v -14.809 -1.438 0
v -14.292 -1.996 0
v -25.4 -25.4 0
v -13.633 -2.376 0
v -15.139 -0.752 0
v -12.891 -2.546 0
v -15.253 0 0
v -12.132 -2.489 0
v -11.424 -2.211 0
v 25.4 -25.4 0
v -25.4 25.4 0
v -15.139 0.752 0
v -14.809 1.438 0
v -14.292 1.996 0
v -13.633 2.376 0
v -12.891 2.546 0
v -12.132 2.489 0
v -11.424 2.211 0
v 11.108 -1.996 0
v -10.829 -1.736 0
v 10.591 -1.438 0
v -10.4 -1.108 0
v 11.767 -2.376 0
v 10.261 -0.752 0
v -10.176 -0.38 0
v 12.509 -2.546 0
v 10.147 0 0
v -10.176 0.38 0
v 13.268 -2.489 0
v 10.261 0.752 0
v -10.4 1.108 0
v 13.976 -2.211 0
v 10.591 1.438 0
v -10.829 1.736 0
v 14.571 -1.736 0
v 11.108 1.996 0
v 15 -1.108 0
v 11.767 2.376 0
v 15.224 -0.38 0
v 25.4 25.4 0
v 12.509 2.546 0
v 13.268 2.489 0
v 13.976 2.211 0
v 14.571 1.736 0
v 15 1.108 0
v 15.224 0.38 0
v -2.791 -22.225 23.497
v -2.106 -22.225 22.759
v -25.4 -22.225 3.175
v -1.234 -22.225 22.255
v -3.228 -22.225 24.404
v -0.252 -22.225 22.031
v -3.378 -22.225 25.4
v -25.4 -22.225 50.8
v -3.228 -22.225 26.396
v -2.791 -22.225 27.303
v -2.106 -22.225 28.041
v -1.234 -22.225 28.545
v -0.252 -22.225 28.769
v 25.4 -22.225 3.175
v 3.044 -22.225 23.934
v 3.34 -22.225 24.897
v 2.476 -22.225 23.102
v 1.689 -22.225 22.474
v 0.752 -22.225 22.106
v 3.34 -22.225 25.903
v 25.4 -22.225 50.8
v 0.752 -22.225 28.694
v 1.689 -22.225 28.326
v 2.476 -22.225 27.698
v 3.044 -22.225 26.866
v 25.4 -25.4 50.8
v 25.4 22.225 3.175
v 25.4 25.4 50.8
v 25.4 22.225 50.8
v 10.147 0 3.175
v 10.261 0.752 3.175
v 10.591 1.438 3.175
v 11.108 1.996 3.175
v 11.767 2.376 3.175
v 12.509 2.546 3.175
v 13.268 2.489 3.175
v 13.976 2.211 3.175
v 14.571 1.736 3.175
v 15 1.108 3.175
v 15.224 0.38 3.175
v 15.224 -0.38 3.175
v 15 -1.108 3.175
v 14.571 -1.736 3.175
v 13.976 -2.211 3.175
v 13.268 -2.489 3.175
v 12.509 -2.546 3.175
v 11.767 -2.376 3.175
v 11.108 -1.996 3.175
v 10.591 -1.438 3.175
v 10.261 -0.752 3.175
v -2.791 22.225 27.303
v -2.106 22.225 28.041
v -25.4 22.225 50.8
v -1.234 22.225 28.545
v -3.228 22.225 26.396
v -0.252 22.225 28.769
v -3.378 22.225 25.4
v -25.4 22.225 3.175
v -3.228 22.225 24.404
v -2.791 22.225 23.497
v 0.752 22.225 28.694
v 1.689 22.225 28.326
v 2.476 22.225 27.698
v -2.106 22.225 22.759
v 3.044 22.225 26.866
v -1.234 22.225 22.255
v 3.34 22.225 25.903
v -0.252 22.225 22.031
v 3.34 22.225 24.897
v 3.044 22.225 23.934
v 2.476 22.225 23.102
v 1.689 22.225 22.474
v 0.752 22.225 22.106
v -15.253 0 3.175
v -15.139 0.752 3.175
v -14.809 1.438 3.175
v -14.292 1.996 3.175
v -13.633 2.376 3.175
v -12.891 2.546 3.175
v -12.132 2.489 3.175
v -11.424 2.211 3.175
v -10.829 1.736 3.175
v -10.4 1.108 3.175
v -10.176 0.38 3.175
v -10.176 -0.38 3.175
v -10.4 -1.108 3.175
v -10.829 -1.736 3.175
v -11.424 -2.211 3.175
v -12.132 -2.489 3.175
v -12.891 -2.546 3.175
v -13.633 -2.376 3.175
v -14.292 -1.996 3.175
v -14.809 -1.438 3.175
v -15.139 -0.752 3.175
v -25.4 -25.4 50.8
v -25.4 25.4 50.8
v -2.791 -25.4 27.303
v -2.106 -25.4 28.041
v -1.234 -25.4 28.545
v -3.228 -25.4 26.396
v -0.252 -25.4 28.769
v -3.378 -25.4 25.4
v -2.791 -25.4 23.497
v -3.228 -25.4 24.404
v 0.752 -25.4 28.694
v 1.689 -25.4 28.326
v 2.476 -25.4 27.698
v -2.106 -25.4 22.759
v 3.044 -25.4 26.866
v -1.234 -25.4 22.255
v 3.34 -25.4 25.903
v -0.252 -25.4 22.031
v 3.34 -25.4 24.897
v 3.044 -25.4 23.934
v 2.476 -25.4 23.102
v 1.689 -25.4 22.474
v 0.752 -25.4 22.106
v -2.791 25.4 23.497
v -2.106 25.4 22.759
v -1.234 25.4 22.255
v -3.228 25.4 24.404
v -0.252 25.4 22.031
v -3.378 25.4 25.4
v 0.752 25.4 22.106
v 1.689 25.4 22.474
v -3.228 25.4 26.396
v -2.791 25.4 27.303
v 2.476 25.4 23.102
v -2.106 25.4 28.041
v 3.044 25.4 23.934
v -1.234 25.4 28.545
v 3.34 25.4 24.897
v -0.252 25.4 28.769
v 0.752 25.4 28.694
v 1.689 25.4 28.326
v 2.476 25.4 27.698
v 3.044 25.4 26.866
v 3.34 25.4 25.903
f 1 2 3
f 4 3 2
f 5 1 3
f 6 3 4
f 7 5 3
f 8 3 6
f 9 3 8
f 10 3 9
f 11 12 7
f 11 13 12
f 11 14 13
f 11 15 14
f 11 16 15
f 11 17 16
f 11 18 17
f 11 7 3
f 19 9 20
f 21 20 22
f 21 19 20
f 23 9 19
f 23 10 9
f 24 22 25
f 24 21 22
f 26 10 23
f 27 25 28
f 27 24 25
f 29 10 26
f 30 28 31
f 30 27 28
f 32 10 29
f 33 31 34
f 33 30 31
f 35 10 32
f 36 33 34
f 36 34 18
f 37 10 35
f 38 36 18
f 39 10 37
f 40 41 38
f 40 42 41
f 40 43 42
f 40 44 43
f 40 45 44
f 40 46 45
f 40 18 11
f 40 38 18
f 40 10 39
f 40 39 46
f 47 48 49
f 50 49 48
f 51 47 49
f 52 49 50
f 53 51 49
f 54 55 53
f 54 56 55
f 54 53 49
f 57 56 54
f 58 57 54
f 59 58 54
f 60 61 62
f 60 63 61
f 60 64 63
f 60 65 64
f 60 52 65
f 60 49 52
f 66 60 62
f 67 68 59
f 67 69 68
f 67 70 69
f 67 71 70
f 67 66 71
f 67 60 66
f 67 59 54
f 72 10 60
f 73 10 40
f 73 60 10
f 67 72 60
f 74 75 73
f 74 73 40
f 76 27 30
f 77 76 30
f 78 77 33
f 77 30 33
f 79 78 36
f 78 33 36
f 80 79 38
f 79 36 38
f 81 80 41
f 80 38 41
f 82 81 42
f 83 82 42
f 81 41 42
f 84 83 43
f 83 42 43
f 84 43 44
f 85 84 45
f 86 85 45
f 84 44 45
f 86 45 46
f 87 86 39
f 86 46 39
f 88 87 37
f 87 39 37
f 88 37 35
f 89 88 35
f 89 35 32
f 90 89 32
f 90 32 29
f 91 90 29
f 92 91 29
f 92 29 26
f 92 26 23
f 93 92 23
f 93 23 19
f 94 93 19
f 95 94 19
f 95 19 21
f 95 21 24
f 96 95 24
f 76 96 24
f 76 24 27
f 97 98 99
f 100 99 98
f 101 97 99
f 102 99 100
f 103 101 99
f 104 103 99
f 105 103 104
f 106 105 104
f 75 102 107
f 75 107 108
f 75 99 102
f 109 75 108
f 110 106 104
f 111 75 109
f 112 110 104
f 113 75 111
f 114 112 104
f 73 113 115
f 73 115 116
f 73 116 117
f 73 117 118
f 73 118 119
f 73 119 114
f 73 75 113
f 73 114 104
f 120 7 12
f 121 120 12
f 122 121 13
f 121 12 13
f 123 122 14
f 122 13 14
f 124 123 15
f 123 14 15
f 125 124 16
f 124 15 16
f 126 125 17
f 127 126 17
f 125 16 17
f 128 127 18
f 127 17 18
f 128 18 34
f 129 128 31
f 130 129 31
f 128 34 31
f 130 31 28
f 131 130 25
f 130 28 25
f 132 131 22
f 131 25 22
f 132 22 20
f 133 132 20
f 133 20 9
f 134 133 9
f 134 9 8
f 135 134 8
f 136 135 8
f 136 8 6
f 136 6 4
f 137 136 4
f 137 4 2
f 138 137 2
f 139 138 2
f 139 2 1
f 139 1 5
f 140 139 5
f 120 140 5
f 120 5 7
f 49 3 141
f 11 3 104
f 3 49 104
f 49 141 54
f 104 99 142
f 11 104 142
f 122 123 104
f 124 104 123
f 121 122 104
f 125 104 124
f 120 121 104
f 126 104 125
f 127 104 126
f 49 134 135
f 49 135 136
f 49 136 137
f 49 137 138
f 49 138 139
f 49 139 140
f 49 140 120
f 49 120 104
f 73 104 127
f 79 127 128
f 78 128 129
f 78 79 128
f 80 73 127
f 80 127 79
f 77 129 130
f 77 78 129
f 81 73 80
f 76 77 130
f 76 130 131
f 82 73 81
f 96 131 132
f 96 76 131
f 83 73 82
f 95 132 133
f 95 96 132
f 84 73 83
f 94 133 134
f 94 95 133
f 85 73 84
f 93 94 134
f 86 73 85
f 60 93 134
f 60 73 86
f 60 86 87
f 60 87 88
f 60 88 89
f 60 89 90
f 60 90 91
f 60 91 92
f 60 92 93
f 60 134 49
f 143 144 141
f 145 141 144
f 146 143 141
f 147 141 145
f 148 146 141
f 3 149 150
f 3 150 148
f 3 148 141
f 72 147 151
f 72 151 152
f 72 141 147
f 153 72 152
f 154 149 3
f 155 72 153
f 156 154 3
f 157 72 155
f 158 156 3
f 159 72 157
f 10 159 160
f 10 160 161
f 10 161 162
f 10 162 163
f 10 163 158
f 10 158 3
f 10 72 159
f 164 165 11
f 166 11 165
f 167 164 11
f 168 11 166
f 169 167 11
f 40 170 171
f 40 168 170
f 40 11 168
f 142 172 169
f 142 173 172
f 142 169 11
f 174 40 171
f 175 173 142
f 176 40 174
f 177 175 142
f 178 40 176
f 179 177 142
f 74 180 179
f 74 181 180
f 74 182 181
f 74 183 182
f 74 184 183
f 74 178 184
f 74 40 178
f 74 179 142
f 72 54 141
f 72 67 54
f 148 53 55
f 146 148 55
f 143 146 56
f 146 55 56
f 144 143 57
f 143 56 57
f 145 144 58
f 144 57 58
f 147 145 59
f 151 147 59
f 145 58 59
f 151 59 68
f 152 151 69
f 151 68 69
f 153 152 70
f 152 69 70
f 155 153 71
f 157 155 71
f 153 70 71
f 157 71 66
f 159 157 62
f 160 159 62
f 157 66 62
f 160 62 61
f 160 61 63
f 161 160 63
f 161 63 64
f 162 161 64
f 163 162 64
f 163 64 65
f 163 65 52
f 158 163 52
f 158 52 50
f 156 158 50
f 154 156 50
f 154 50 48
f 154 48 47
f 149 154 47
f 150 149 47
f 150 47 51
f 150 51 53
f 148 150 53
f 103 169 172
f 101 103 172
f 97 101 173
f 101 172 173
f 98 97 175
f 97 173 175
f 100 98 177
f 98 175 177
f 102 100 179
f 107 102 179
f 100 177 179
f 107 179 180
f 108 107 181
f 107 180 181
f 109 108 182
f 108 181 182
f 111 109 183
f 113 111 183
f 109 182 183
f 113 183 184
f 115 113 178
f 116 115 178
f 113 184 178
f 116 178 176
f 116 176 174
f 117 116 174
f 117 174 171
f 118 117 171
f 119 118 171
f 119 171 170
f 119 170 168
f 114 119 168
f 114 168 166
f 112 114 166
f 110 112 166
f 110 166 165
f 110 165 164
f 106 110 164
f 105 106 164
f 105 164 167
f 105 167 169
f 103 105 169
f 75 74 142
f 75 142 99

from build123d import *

# Parameters (mm, degrees)
F1_DEPTH = 25.4
F3_D     = 5.1054
F5_D     = 6.7564


with BuildPart() as f1:
    # F0 (on Right) → F1 (new body, symmetric)
    with BuildSketch(Plane.YZ):
        Polygon((-25.4, 50.8), (-25.4, 0), (0, 0), (0, 3.175), (-22.225, 3.175), (-22.225, 50.8), align=None)
        Polygon((0, 3.175), (0, 0), (25.4, 0), (25.4, 50.8), (22.225, 50.8), (22.225, 3.175), align=None)
    extrude(amount=F1_DEPTH, both=True)

    # F3 (through all)
    with Locations(Plane.XY.offset(3.175)):
        with Locations((-12.7, 0), (12.7, 0)):
            Hole(F3_D / 2)

    # F5 (through all)
    with Locations(Plane.XZ.offset(25.4)):
        with Locations((0, 25.4)):
            Hole(F5_D / 2)


solid = f1.part
